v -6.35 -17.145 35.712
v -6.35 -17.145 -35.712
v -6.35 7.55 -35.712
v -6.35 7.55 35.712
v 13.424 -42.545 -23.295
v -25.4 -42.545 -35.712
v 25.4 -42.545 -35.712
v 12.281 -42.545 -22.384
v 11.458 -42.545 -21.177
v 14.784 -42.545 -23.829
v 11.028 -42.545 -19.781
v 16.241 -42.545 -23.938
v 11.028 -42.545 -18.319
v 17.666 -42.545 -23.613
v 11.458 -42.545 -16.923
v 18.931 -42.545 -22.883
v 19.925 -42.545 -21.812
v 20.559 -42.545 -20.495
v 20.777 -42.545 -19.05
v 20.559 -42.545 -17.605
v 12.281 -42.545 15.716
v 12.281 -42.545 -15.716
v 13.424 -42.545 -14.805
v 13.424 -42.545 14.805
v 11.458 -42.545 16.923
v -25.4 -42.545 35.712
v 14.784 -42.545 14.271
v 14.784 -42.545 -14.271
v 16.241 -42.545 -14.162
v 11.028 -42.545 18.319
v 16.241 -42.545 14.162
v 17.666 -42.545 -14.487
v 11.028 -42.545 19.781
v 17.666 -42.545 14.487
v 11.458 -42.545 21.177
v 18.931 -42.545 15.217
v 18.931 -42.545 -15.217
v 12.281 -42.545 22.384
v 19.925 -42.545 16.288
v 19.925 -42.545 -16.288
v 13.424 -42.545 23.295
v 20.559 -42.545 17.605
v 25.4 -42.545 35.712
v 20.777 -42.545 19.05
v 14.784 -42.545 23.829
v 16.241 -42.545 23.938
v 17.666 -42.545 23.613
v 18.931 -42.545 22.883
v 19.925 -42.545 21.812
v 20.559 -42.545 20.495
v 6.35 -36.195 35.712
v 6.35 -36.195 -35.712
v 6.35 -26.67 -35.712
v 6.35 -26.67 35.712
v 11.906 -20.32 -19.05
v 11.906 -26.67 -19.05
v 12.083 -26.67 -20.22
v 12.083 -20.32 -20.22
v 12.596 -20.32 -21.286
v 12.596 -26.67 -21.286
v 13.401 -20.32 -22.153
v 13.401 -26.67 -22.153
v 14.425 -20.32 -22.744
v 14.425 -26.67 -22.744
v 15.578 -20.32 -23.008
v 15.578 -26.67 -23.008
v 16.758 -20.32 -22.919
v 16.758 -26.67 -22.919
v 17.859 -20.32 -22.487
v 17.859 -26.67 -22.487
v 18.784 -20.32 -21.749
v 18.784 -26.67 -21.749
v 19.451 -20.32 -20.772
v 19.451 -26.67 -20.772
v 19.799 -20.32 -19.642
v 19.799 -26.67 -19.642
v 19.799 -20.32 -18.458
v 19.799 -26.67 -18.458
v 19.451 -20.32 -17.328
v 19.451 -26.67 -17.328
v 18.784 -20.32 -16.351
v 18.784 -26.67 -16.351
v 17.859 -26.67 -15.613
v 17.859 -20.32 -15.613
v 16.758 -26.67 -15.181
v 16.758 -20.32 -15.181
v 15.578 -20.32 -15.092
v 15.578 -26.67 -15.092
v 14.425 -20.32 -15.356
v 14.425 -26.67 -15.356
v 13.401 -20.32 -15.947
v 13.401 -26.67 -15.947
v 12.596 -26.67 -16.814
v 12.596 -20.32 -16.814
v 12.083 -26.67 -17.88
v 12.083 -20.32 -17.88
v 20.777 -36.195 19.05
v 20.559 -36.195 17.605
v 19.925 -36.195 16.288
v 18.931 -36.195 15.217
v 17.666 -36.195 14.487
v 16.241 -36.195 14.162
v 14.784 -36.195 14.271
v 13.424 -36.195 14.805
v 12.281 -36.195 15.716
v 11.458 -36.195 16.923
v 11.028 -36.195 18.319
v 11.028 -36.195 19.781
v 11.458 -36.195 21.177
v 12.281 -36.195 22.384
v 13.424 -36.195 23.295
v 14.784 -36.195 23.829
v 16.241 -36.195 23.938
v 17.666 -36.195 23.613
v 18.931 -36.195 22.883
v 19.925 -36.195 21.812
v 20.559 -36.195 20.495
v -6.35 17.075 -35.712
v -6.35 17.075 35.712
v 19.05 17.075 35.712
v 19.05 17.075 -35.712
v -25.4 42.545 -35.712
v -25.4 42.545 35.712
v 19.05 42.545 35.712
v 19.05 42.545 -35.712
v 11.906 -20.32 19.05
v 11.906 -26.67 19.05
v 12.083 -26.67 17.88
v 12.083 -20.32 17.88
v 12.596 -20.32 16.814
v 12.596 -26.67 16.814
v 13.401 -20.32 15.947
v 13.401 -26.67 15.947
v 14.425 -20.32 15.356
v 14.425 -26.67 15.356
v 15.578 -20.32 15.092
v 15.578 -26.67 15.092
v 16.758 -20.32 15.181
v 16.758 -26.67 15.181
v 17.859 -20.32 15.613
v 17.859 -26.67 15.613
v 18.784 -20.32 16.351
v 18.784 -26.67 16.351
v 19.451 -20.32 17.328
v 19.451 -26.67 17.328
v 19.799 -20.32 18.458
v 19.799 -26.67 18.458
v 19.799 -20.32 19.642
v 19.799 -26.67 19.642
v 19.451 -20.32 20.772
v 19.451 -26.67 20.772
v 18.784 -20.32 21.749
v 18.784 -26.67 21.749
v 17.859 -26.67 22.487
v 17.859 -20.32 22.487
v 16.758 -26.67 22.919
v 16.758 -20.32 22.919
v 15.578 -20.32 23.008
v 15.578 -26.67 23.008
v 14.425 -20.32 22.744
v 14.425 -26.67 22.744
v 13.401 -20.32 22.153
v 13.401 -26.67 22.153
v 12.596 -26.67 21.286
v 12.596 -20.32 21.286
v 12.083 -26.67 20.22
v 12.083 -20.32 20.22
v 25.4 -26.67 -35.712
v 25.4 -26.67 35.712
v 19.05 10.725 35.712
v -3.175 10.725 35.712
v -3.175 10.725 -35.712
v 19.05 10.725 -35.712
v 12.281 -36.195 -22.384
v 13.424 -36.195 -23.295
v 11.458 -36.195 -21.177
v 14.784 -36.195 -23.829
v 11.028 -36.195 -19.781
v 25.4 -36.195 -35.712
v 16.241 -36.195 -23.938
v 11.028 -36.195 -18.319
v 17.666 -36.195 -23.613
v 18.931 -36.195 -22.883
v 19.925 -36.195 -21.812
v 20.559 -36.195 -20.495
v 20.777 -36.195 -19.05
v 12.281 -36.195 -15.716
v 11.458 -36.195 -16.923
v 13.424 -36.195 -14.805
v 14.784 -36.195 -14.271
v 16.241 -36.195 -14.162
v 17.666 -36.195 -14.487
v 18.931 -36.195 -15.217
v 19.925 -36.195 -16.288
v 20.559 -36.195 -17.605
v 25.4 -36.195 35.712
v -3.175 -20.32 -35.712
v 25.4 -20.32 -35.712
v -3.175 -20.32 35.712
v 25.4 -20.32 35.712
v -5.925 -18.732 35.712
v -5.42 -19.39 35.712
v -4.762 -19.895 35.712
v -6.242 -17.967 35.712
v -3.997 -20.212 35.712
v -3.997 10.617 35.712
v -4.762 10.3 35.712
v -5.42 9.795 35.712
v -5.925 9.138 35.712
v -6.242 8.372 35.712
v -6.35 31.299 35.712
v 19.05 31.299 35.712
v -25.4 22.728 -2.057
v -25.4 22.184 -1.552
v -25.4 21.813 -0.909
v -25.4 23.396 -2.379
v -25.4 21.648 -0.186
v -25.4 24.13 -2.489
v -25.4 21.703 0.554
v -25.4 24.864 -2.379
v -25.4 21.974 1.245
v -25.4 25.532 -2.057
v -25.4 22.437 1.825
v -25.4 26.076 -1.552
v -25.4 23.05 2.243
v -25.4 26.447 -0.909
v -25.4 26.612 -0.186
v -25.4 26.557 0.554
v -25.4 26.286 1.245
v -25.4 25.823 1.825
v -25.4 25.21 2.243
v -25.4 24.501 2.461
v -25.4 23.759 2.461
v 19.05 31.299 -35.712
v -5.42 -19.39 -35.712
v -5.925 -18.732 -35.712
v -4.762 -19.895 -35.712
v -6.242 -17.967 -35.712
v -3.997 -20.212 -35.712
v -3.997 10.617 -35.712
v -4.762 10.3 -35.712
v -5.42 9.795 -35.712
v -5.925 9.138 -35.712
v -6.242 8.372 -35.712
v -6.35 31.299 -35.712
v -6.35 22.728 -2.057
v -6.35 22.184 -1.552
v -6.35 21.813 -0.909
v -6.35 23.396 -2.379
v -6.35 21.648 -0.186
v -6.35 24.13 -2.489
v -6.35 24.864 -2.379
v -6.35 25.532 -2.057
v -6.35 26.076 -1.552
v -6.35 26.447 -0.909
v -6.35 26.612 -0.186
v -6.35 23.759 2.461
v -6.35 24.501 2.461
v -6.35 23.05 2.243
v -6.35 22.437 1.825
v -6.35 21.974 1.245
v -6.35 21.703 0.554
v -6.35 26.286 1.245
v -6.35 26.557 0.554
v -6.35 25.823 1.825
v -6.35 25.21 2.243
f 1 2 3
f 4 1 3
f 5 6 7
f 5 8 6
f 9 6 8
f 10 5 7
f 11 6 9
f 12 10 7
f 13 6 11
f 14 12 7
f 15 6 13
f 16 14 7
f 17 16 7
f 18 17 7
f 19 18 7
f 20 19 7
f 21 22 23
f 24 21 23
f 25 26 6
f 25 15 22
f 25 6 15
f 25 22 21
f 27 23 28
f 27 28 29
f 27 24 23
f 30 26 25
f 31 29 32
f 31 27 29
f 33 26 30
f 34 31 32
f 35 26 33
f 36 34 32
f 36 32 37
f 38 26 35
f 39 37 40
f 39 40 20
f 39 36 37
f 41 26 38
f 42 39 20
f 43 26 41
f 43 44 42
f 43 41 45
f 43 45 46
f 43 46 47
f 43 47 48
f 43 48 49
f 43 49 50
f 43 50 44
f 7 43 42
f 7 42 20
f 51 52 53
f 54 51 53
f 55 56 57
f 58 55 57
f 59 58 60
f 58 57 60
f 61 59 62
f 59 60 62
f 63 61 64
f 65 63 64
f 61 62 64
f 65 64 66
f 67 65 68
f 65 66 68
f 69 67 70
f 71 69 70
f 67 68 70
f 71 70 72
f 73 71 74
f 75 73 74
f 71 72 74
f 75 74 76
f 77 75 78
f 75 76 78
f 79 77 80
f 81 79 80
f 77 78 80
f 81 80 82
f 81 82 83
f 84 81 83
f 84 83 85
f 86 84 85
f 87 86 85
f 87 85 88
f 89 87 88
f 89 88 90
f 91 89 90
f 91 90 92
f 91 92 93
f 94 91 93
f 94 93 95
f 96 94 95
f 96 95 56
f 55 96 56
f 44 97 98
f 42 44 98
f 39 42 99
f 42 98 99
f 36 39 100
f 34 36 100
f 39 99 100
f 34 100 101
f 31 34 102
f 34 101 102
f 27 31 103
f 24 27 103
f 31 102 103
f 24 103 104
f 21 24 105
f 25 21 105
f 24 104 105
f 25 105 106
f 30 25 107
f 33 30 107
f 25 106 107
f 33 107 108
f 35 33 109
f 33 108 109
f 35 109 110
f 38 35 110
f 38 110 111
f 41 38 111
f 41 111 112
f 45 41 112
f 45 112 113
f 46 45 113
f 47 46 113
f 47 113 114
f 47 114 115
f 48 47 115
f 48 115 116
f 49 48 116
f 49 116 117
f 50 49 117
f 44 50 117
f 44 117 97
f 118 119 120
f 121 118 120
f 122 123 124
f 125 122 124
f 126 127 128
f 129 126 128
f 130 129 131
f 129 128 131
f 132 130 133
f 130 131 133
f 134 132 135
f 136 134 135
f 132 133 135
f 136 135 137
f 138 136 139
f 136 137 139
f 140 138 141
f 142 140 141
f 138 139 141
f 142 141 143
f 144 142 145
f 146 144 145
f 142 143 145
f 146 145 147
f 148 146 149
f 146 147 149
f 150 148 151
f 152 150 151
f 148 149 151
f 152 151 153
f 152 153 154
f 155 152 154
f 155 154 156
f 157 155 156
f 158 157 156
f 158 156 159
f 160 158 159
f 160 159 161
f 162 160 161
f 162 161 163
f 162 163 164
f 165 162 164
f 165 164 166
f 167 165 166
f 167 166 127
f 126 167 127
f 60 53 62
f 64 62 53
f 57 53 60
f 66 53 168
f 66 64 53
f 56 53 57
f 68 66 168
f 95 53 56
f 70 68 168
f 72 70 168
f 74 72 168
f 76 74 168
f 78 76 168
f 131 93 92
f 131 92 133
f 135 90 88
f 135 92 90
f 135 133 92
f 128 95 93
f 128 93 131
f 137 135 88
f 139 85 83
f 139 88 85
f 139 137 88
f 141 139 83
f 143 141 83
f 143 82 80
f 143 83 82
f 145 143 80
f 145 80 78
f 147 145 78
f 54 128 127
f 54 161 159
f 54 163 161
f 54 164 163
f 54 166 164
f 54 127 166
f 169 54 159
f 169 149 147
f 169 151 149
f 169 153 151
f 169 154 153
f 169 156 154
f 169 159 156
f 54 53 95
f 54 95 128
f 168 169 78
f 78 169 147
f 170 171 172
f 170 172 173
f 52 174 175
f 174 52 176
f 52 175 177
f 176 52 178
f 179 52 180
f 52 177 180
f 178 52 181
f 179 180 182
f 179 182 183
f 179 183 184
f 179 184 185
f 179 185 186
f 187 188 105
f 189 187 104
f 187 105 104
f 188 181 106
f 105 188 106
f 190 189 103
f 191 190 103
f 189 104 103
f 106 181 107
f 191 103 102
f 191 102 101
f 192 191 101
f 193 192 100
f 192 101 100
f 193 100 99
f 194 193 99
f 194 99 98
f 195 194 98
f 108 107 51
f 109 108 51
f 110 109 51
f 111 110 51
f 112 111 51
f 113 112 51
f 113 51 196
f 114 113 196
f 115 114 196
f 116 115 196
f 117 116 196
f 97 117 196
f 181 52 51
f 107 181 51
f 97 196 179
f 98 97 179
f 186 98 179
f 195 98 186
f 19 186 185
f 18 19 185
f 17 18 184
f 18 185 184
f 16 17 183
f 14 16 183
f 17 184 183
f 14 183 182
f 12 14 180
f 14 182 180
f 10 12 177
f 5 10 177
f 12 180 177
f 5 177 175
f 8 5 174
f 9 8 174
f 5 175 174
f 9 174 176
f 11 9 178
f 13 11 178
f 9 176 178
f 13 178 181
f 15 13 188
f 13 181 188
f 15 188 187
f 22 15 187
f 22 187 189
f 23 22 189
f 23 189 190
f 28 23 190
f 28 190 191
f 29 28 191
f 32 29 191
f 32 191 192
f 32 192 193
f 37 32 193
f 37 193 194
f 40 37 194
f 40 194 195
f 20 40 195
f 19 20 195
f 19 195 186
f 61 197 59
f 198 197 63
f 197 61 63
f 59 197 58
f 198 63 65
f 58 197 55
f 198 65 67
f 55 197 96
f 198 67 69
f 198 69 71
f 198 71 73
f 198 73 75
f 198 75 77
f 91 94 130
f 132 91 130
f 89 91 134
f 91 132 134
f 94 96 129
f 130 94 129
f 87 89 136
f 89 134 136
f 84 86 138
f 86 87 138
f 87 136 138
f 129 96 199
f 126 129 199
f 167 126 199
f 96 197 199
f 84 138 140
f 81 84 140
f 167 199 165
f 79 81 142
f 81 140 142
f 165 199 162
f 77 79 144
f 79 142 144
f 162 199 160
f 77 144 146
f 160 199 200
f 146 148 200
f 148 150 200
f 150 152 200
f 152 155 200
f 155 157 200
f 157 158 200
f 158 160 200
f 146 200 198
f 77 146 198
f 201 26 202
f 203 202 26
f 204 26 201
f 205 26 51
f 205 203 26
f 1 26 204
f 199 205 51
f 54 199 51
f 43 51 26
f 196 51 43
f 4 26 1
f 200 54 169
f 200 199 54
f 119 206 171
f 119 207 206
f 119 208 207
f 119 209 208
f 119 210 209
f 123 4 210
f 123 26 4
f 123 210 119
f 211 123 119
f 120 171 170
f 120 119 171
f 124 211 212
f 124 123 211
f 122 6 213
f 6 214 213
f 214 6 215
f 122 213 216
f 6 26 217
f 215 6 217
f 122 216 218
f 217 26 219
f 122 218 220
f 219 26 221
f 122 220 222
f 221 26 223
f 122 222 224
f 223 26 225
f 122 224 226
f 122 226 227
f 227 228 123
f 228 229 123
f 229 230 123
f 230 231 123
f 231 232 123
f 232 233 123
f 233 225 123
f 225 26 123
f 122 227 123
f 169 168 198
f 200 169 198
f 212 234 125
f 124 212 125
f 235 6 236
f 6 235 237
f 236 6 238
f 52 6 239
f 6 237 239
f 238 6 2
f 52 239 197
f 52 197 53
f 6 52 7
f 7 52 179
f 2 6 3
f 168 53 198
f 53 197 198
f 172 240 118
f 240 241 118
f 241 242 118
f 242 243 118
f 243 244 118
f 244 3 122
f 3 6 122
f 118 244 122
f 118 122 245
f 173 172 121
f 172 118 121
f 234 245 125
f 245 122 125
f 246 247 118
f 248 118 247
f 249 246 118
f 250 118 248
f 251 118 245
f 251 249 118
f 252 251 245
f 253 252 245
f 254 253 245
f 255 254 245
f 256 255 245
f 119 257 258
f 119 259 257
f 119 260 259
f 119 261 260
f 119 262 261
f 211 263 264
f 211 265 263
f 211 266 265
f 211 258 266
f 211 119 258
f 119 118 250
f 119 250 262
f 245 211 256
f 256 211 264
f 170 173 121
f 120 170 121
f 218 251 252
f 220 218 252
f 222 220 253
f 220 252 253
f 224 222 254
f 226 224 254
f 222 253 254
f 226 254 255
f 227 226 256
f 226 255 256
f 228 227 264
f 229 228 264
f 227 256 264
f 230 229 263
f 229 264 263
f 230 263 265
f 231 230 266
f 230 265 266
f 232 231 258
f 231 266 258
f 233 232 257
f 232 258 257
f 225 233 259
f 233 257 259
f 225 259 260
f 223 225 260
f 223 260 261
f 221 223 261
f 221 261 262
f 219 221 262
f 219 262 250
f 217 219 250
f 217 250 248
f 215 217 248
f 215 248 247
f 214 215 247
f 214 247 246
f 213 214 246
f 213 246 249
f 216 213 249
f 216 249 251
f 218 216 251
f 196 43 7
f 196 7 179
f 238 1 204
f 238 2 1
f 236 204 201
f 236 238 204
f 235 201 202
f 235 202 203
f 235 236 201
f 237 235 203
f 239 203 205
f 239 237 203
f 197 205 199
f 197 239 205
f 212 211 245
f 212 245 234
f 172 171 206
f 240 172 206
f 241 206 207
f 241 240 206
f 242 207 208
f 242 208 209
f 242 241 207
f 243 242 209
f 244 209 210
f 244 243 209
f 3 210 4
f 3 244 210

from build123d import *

# Parameters (mm, degrees)
SKETCH1_W                   = 50.8
SKETCH1_H                   = 85.09
BOSS_EXTRUDE1_DEPTH         = 35.7124
CUT_EXTRUDE1_REACH          = 88.93
SKETCH2_W                   = 31.749988824
SKETCH2_H                   = 31.04515
SKETCH4_W                   = 31.749988824
SKETCH4_H                   = 14.224
CUT_EXTRUDE2_DEPTH          = 87.929506383
CUT_EXTRUDE3_REACH          = 88.93
SKETCH5_W                   = 19.05
SKETCH5_H                   = 9.525
CUT_EXTRUDE4_START          = -71.4248
SKETCH6_W                   = 6.35
SKETCH6_H                   = 31.81985
CUT_EXTRUDE4_DEPTH          = 71.4248
F_10_CLEARANCE_HOLE1_D      = 4.9784
F_3_8_CLEARANCE_HOLE1_D     = 9.8044
F_3_8_CLEARANCE_HOLE1_DEPTH = 6.35
F_3_8_16_TAPPED_HOLE1_D     = 7.9375
F_3_8_16_TAPPED_HOLE1_DEPTH = 6.35
FILLET1_R                   = 3.175


with BuildPart() as part:
    # Sketch1 → Boss-Extrude1 (new, symmetric)
    with BuildSketch(Plane.XY):
        Rectangle(SKETCH1_W, SKETCH1_H)
    extrude(amount=BOSS_EXTRUDE1_DEPTH, both=True)

    # Sketch2 → Cut-Extrude1 (cut, up to next)
    with BuildSketch(Plane.XY.offset(35.7124), mode=Mode.PRIVATE) as cut_extrude1_sk1:
        with Locations((9.525005588, -4.797425)):
            Rectangle(SKETCH2_W, SKETCH2_H)
    cut_extrude1_tool1 = extrude(cut_extrude1_sk1.sketch, amount=-CUT_EXTRUDE1_REACH, mode=Mode.PRIVATE) & part.part
    add(cut_extrude1_tool1.solids().sort_by_distance((9.525006, -4.797425, 35.7124))[0], mode=Mode.SUBTRACT)

    # Sketch4 → Cut-Extrude2 (cut, through all)
    with BuildSketch(Plane.XY.offset(35.7124)):
        with Locations((9.525005588, 24.18715)):
            Rectangle(SKETCH4_W, SKETCH4_H)
    extrude(amount=-CUT_EXTRUDE2_DEPTH, mode=Mode.SUBTRACT)

    # Sketch5 → Cut-Extrude3 (cut, up to next)
    with BuildSketch(Plane.XY.offset(35.7124), mode=Mode.PRIVATE) as cut_extrude3_sk1:
        with Locations((15.875, -31.4325)):
            Rectangle(SKETCH5_W, SKETCH5_H)
    cut_extrude3_tool1 = extrude(cut_extrude3_sk1.sketch, amount=-CUT_EXTRUDE3_REACH, mode=Mode.PRIVATE) & part.part
    add(cut_extrude3_tool1.solids().sort_by_distance((15.875, -31.4325, 35.7124))[0], mode=Mode.SUBTRACT)

    # Sketch6 → Cut-Extrude4 (cut)
    with BuildSketch(Plane.XY.offset(35.7124).offset(CUT_EXTRUDE4_START)):
        with Locations((22.225, 26.635075)):
            Rectangle(SKETCH6_W, SKETCH6_H)
    extrude(amount=CUT_EXTRUDE4_DEPTH, mode=Mode.SUBTRACT)

    # #10 Clearance Hole1 (through all)
    with Locations(Plane.ZY.offset(25.4)):
        with Locations((0, 24.13)):
            Hole(F_10_CLEARANCE_HOLE1_D / 2)

    # 3/8 Clearance Hole1
    with Locations(Plane(origin=(0, -42.545, 0), x_dir=(-1, 0, 0), z_dir=(0, -1, 0))):
        with Locations((-15.875, -19.05), (-15.875, 19.05)):
            Hole(F_3_8_CLEARANCE_HOLE1_D / 2, depth=F_3_8_CLEARANCE_HOLE1_DEPTH)

    # 3/8-16 Tapped Hole1
    with Locations(Plane(origin=(0, -20.32, 0), x_dir=(1, 0, 0), z_dir=(0, 1, 0))):
        with Locations((15.875, -19.05), (15.875, 19.05)):
            Hole(F_3_8_16_TAPPED_HOLE1_D / 2, depth=F_3_8_16_TAPPED_HOLE1_DEPTH)

    # Fillet1
    fillet1_edges = [part.edges().sort_by_distance(p)[0] for p in [
        (-6.349988824, -20.32, 0),
        (-6.349988824, 10.72515, 0),
    ]]
    fillet(fillet1_edges, radius=FILLET1_R)


solid = part.part
